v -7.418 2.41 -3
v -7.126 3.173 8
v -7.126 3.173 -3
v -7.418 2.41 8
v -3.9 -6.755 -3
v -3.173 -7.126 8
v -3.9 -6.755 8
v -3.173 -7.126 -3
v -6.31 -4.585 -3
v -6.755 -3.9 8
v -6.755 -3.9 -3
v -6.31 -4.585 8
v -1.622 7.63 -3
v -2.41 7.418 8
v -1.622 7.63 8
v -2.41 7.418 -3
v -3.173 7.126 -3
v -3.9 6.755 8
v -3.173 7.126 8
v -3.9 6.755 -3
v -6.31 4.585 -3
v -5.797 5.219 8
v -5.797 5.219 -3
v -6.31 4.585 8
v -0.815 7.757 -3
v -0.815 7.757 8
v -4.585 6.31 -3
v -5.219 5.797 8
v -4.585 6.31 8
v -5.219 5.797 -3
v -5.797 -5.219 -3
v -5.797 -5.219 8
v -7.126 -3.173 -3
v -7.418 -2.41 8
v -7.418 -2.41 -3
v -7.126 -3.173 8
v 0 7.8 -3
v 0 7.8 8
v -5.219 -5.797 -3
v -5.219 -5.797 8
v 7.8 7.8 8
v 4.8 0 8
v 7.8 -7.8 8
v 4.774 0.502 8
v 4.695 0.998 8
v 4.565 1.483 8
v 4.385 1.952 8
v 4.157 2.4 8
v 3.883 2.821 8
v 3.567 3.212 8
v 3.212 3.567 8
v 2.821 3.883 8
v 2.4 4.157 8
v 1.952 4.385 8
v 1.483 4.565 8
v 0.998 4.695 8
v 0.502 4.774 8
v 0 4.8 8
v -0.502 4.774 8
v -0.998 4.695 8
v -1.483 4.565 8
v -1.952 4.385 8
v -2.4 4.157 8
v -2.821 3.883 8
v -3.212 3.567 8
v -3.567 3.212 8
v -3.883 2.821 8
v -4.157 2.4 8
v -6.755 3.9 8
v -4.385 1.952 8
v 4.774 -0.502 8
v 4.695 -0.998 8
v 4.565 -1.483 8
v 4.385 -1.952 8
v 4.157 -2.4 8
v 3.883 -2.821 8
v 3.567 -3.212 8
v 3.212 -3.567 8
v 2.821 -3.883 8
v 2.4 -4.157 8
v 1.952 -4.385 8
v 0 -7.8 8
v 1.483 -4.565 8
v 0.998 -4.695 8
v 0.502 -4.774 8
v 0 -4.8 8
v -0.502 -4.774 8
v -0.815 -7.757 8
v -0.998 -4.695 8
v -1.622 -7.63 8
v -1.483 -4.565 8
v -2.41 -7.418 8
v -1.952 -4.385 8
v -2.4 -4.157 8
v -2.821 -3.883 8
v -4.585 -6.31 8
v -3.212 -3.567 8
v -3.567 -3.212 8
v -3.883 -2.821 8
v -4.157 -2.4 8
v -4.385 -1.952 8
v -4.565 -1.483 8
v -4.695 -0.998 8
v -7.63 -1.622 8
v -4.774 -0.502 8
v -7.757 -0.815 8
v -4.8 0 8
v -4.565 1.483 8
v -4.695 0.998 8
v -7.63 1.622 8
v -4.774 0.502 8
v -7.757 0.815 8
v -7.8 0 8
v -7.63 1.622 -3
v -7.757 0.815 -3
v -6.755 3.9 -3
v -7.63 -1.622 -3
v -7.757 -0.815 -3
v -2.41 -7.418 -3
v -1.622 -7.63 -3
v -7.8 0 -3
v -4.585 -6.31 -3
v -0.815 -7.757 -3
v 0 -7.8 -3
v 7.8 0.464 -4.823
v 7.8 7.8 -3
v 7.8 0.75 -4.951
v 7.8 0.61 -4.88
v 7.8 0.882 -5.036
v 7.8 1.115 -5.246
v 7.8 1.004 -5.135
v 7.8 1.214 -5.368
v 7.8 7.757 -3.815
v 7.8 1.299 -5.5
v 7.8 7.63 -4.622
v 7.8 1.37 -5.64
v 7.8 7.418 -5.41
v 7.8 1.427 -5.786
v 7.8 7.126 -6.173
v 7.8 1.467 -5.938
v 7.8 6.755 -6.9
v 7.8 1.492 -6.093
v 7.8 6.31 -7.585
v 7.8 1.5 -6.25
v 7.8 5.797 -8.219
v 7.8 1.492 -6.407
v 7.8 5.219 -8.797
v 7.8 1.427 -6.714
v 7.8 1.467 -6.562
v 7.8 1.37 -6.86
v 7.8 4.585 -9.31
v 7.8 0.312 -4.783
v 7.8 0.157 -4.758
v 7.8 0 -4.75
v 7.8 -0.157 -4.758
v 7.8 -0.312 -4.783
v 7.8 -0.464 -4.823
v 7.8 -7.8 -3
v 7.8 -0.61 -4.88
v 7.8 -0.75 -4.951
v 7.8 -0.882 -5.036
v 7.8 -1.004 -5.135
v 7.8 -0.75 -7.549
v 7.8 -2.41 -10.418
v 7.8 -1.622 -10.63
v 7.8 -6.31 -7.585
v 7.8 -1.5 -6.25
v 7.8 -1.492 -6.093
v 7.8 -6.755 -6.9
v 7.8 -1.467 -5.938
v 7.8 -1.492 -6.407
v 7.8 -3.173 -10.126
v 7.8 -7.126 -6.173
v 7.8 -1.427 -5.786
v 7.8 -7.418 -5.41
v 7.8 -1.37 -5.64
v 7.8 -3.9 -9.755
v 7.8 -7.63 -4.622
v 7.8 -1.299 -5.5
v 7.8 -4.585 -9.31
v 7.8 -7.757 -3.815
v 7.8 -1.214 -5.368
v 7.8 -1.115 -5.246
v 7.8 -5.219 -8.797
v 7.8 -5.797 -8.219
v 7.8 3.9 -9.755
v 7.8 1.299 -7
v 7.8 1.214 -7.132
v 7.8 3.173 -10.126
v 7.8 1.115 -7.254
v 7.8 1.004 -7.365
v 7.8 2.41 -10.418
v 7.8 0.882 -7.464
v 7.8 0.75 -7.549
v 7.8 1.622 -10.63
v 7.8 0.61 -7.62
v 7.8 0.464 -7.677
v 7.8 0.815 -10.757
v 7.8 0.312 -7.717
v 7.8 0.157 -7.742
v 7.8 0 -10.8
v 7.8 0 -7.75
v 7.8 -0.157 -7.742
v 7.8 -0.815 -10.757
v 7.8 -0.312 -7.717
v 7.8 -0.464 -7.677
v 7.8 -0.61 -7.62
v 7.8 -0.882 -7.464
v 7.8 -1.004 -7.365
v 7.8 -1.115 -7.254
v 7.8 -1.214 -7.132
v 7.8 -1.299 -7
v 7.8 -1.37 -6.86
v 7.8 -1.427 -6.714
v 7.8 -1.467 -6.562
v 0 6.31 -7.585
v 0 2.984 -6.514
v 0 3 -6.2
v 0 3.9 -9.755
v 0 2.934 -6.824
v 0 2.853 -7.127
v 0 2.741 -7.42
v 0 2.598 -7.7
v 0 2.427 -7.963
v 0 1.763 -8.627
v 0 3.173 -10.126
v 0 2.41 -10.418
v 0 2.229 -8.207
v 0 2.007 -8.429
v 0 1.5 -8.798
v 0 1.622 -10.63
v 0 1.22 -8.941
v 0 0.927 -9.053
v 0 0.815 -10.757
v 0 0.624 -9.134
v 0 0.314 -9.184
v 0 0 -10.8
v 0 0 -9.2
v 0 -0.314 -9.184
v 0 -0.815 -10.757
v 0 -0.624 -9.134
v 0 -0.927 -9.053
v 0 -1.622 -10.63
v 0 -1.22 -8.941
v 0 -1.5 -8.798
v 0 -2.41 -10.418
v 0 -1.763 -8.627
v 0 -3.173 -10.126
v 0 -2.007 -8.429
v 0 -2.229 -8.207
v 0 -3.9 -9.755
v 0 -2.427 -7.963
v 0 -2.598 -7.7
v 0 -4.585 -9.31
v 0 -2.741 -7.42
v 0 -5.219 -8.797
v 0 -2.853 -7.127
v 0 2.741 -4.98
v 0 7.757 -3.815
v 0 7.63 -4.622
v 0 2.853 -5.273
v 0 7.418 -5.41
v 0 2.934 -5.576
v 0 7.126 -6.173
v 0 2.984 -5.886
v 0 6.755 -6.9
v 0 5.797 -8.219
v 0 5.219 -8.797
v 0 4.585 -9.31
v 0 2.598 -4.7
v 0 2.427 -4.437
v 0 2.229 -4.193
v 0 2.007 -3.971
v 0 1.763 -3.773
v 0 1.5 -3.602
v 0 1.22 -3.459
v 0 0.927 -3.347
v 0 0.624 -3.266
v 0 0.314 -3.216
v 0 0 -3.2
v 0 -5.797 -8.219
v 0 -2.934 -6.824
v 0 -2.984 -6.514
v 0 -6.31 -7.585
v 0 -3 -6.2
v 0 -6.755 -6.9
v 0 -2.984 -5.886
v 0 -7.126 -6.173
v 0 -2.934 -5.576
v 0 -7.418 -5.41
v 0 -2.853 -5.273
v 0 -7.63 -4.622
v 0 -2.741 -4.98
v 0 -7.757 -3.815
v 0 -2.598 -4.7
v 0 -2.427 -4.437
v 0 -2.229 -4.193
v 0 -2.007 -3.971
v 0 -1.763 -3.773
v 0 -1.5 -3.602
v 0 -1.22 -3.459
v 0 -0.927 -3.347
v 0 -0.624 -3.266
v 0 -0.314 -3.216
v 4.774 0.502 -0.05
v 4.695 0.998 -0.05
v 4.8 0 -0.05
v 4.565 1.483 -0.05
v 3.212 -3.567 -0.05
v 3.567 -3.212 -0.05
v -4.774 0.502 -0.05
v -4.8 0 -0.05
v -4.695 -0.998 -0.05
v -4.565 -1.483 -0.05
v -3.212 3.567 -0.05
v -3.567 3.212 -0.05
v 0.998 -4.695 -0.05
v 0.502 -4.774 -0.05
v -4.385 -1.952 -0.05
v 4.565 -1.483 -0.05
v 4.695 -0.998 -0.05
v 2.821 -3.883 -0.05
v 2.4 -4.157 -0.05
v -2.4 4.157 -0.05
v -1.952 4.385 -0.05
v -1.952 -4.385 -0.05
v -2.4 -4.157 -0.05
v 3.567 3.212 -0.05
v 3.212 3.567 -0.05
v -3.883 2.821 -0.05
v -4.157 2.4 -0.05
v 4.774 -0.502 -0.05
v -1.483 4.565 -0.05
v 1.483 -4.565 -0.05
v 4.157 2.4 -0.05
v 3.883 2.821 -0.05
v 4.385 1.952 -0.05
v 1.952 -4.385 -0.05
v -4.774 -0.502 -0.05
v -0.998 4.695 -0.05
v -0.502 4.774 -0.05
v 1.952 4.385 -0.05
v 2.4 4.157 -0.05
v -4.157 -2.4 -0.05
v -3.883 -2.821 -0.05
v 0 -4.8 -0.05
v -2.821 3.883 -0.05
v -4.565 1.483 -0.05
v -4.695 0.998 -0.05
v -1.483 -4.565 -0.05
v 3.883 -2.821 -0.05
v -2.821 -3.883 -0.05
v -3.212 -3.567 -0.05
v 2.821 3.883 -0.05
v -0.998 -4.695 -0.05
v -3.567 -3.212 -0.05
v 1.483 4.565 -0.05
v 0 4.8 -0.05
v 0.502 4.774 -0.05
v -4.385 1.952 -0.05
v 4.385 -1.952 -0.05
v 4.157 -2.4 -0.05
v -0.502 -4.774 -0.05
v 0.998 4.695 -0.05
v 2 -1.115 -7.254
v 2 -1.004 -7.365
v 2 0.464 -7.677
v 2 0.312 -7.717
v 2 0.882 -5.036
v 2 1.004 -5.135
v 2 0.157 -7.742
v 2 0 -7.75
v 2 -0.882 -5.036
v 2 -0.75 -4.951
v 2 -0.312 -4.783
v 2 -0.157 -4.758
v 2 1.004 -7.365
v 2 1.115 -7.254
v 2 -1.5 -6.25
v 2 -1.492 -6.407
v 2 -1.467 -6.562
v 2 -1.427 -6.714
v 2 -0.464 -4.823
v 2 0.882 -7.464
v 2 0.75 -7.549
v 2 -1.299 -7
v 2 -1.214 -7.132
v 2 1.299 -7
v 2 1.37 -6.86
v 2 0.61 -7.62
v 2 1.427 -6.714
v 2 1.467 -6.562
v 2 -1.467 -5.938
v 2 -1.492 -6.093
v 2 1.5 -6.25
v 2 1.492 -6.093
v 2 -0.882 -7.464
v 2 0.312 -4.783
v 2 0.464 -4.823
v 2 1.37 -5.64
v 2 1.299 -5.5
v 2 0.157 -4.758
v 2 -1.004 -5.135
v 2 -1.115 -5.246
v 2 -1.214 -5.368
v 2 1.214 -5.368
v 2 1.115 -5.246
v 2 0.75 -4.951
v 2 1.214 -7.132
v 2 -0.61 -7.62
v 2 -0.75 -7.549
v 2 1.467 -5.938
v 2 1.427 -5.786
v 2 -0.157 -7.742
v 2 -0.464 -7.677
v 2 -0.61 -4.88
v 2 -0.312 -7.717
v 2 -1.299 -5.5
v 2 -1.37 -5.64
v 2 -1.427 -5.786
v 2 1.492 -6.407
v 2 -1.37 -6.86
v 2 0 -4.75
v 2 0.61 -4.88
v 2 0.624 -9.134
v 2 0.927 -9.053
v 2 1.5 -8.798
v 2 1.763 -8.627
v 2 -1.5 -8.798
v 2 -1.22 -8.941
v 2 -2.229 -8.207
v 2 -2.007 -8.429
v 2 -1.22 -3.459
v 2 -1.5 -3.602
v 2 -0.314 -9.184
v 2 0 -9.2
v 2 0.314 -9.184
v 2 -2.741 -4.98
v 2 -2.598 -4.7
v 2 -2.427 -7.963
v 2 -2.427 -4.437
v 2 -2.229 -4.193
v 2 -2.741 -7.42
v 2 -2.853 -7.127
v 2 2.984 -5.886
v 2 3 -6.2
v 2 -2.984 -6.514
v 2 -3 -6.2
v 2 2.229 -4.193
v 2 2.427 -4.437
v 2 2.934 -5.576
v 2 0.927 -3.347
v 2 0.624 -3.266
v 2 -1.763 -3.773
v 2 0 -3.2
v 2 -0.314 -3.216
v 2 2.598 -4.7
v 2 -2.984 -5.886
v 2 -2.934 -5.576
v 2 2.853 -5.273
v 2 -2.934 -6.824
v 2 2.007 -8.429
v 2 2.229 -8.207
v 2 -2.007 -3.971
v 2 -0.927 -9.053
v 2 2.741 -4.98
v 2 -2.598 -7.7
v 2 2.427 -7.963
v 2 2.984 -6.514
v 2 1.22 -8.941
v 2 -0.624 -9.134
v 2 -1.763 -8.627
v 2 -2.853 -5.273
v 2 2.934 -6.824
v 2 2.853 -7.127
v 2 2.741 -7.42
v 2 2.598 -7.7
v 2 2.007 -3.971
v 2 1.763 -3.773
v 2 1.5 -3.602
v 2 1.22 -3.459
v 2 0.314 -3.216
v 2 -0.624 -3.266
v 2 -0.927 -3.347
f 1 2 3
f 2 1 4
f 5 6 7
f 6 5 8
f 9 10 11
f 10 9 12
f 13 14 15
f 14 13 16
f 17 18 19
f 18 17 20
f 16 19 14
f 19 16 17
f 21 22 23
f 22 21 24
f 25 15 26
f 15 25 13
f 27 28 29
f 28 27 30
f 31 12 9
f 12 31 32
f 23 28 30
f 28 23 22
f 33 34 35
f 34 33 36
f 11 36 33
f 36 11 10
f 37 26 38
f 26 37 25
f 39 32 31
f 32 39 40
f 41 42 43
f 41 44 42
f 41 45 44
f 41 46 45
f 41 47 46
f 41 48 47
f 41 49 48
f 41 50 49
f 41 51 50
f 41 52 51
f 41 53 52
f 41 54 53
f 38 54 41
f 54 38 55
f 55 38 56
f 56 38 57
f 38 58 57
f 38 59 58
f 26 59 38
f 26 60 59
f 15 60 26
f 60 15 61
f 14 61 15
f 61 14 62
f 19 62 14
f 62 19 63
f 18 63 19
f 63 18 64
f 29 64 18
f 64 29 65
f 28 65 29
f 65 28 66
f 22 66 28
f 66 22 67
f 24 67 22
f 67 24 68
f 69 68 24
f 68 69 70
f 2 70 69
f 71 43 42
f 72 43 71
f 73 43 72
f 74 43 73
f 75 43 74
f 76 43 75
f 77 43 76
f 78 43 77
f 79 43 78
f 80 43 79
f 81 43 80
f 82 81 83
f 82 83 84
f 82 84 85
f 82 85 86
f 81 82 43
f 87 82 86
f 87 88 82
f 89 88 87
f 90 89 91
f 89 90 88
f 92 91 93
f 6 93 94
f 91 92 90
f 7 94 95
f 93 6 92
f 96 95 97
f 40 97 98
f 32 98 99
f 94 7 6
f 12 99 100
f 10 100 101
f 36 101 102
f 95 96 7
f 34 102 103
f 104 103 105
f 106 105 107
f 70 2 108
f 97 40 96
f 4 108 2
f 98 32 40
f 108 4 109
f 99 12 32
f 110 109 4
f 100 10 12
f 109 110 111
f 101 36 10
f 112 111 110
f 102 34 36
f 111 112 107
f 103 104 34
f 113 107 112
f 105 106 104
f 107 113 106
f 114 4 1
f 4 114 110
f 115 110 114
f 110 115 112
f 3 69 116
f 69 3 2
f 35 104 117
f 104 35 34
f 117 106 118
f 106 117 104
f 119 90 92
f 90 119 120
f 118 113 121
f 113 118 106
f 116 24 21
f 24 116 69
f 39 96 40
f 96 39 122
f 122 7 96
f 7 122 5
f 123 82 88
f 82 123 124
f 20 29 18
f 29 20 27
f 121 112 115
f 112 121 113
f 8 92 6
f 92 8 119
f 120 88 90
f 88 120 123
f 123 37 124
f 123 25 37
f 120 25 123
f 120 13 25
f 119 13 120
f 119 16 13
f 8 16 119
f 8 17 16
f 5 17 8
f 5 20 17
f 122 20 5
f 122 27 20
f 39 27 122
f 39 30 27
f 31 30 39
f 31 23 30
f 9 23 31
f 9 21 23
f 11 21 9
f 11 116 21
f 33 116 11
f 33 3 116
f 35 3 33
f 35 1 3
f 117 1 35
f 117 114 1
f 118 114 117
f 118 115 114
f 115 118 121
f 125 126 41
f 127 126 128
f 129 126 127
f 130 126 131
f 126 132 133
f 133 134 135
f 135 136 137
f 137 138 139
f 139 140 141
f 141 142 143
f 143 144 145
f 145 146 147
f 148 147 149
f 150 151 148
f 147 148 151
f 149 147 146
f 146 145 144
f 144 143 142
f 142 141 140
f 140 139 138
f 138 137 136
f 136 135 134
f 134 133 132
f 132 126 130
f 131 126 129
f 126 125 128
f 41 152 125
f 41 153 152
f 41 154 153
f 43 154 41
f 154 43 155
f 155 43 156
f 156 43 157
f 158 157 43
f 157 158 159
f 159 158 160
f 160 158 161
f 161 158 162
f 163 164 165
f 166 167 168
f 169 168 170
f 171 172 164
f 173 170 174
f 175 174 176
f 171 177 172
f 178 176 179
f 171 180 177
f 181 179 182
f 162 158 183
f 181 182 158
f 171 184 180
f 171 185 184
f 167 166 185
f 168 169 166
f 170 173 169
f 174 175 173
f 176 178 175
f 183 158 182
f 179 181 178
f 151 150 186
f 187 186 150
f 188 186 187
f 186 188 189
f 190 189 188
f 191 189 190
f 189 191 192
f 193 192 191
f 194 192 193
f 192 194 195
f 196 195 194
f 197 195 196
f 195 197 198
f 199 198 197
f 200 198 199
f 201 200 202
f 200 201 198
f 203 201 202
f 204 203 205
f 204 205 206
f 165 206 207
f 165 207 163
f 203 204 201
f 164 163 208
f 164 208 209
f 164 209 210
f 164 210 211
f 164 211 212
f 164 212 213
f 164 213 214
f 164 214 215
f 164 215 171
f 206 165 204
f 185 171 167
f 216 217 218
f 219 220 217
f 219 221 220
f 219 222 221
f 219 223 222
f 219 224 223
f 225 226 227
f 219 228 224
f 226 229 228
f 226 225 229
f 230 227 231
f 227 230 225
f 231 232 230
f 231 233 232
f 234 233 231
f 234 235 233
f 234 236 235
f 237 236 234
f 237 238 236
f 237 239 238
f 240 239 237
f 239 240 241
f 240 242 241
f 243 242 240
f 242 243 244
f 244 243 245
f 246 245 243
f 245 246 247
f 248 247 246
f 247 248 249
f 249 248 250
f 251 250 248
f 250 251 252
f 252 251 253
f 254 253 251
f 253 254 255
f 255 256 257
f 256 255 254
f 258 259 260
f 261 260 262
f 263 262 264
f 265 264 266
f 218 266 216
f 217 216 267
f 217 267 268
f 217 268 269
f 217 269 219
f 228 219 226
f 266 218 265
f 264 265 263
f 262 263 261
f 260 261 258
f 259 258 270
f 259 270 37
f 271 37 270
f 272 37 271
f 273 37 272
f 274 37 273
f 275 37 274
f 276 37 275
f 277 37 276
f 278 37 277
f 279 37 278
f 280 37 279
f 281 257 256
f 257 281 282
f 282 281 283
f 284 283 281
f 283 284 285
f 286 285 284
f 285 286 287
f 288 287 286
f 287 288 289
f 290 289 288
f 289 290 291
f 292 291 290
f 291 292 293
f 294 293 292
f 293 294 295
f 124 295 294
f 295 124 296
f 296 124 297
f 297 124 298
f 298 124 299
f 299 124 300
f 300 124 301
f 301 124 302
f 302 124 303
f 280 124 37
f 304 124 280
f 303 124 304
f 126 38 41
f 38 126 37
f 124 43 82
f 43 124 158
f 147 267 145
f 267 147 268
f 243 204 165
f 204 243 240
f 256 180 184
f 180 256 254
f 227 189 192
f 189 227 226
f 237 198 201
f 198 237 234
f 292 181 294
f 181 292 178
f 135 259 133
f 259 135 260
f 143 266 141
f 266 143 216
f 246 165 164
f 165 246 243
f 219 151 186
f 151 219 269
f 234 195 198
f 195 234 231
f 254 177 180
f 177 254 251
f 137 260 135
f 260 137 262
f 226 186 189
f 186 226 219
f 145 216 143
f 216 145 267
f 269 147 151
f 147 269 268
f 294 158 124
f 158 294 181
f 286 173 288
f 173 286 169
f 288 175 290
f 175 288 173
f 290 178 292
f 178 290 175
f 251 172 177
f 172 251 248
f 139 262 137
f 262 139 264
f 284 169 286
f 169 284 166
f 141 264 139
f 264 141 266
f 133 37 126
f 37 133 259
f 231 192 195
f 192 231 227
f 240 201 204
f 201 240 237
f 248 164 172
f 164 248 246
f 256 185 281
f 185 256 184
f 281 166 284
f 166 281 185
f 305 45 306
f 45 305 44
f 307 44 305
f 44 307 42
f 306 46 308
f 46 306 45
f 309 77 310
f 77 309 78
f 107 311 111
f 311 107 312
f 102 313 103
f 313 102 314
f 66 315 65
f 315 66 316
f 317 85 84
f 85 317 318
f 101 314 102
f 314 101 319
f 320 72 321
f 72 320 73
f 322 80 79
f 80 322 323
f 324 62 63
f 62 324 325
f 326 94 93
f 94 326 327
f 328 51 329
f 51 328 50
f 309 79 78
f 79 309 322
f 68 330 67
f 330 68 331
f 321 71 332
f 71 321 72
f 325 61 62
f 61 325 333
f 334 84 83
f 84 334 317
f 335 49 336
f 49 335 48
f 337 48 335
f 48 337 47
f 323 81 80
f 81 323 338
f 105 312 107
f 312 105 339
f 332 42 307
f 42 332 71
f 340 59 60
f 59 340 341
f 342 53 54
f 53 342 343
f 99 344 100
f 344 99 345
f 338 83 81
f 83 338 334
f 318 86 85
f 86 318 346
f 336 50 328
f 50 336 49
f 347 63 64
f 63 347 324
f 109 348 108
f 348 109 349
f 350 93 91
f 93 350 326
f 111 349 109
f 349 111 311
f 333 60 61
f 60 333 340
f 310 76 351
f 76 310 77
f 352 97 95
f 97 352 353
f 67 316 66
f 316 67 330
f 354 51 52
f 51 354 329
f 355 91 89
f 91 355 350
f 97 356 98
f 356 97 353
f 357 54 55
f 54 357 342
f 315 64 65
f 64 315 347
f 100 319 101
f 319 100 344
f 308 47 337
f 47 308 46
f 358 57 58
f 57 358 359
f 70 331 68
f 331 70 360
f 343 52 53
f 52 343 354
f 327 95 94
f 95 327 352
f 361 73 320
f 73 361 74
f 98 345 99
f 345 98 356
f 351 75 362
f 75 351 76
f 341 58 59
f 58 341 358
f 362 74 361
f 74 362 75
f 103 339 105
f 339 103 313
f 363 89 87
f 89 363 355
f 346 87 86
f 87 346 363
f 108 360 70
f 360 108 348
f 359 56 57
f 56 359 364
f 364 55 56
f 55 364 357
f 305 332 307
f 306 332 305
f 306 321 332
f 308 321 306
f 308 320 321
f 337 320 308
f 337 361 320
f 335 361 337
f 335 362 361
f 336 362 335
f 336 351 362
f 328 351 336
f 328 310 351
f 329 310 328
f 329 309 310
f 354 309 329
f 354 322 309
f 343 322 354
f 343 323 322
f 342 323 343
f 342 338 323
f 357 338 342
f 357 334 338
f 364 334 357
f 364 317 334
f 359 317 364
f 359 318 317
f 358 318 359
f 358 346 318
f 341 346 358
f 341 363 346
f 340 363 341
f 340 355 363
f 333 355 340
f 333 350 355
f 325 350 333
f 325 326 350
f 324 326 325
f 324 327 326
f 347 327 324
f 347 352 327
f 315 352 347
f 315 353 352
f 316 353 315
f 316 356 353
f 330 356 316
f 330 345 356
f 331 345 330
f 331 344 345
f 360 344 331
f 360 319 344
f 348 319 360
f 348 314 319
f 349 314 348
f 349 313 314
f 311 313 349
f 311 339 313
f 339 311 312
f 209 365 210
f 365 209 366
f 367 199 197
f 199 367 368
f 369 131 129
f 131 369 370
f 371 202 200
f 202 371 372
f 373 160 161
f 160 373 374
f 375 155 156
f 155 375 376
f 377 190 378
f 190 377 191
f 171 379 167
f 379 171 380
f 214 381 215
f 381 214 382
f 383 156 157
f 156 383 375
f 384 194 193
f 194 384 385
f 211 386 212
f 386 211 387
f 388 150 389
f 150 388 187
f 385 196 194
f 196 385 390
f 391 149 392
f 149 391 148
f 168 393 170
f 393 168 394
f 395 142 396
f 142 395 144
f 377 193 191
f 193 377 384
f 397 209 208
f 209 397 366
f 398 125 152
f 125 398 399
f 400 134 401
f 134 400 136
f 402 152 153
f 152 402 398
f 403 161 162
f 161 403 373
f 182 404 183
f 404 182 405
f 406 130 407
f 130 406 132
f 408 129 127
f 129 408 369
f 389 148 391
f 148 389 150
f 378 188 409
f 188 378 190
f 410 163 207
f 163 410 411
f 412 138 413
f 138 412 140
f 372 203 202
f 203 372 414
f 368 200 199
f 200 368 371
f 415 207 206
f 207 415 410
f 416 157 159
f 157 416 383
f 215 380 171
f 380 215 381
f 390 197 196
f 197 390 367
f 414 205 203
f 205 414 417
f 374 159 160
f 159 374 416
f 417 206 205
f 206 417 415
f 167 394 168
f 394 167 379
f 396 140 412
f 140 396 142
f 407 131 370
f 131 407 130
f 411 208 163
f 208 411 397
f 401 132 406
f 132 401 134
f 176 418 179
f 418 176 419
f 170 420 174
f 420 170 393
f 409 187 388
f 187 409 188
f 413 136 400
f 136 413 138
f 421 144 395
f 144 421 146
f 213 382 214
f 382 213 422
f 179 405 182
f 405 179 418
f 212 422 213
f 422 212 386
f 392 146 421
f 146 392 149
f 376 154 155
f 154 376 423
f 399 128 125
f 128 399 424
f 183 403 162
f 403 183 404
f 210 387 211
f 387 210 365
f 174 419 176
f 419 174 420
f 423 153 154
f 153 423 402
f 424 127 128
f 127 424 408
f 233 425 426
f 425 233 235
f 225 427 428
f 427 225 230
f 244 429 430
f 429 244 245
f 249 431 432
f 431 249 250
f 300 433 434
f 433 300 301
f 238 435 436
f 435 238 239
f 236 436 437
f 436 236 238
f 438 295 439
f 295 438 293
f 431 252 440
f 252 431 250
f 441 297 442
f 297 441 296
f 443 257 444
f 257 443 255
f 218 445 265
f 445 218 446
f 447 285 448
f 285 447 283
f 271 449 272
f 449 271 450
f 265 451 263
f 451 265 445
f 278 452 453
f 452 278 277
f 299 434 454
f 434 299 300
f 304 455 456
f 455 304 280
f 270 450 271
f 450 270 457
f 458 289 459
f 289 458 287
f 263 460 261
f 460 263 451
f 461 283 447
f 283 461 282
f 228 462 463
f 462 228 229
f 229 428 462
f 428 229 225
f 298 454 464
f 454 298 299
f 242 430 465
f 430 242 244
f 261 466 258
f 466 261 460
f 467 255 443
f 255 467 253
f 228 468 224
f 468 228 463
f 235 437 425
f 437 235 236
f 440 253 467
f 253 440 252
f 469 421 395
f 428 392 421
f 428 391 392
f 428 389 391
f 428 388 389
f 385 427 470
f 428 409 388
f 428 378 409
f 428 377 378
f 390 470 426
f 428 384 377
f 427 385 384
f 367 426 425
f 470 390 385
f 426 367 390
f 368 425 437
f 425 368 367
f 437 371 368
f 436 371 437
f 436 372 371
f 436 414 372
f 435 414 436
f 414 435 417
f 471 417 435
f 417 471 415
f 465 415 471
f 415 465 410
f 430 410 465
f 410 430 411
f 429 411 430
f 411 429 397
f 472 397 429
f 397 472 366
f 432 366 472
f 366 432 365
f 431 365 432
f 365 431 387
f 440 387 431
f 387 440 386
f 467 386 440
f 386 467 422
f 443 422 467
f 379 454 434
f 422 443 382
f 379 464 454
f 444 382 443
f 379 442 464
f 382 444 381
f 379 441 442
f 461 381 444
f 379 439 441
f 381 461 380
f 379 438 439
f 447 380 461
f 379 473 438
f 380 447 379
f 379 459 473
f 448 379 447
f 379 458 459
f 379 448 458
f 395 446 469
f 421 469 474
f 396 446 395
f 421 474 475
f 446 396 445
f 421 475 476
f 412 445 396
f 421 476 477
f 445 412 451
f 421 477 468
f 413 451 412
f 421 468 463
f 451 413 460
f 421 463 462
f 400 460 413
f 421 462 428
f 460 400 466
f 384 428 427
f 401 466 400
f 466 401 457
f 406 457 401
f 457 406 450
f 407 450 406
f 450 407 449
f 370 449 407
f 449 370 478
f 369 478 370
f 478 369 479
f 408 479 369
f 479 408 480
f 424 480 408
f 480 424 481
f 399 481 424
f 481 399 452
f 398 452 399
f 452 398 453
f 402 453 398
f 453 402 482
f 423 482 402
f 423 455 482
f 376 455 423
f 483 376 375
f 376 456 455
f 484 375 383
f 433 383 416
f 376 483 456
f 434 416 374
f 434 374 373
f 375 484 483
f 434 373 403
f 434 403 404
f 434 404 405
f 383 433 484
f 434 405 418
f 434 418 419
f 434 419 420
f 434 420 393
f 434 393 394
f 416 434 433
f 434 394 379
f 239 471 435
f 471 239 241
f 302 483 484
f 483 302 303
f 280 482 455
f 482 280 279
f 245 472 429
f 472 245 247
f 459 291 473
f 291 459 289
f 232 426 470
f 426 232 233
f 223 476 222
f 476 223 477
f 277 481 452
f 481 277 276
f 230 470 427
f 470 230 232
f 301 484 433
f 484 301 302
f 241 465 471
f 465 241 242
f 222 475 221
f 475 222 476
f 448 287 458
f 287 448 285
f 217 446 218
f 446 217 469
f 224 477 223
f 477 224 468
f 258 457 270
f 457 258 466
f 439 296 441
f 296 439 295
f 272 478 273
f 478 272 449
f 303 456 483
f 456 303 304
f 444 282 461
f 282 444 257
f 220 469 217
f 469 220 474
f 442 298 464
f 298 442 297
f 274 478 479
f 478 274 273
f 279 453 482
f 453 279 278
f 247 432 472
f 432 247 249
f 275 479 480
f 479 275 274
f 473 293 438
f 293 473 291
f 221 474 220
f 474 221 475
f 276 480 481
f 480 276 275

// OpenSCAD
// -----------------------------------------------------------
// Customizable Socket Organizers: Circular End Cap with Mount
// -----------------------------------------------------------
//
// Zemba Craftworks
// youtube.com/zembacraftworks
// thingiverse.com/zembacraftworks/about

// This is a configurable, 3D printable insert designed to
// slide onto a metal or wooden bar to create socket set
// organizers. Dimensions can be adjusted for sockets of
// all sizes and to slide onto bars/holders of any size.

// Date Created:  2018-08-15
// Last Modified: 2018-12-19

// Critical Dimensions
// -------------------
// Adjust these dimensions and verify them with a test print
// before printing holders for all of your sockets! You want a
// snug fit but not so tight that anything gets stuck. These
// values will vary depending on your sockets, the rail you're
// using, and the calibration of your printer.


rr = 4.8;           // Dowel Radius (mm)
                    // (4.8 = approximately 3/8 in * 25.4 mm/in / 2)
fn1 = 60;           // Number of Facets for Curvature 

ct = 3;             // Wall Thickness of End Cap (mm)
ch = 8;             // Height of End Cap (mm)
       
hd1 = 3;            // Mounting Hole Diameter (Through-hole)
hd2 = 6;            // Mounting Hole Diameter (Counterbore)

hz = rr/1.5;        // Mounting Hole Offset Distance (from Rail)
hx = 2;             // Mounting Hole Counterbore Depth

// Tolerance Value
// ---------------
// When shapes are subtracted through difference() in
// OpenSCAD, there is ambiguity if any faces of the two shapes
// occupy the same space. Adding a small value 't' to make
// the subtracted shape slightly larger prevents this.

t = 0.1;

// Create End Cap
union(){

    // Dowel Clamp
    difference(){ 
        union(){
            // Main Dowel Clamp
            cylinder(r=rr+ct,h=ch,$fn=fn1);
            // Main Dowel Cap
            translate([0,0,-ct])
                cylinder(r=rr+ct,h=ct,$fn=fn1);
            // Corner Volume
            translate([0,-rr-ct,-ct ])
                cube([(rr+ct),2*(rr+ct),ch+ct]);
            // Mounting Flange
            translate([0,0,-ct])
            rotate([0,90,0])
                cylinder(r=rr+ct,h=rr+ct,$fn=fn1);
        }
        union(){  
            // Dowel Volume
            translate([0,0,-t/2])
            cylinder(r=rr,h=ch+t,$fn=fn1);

            // Mounting Hole
            translate([0,0,-ct-hz-t/2])
            rotate([0,90,0])
            cylinder(r=hd1/2,h=rr+ct+t,$fn=fn1);

            // Mounting Hole Counterbore
            translate([-t,0,-ct-hz])
            rotate([0,90,0])
            cylinder(r=hd2/2,h=hx+t,$fn=fn1);
        }
    }
}
